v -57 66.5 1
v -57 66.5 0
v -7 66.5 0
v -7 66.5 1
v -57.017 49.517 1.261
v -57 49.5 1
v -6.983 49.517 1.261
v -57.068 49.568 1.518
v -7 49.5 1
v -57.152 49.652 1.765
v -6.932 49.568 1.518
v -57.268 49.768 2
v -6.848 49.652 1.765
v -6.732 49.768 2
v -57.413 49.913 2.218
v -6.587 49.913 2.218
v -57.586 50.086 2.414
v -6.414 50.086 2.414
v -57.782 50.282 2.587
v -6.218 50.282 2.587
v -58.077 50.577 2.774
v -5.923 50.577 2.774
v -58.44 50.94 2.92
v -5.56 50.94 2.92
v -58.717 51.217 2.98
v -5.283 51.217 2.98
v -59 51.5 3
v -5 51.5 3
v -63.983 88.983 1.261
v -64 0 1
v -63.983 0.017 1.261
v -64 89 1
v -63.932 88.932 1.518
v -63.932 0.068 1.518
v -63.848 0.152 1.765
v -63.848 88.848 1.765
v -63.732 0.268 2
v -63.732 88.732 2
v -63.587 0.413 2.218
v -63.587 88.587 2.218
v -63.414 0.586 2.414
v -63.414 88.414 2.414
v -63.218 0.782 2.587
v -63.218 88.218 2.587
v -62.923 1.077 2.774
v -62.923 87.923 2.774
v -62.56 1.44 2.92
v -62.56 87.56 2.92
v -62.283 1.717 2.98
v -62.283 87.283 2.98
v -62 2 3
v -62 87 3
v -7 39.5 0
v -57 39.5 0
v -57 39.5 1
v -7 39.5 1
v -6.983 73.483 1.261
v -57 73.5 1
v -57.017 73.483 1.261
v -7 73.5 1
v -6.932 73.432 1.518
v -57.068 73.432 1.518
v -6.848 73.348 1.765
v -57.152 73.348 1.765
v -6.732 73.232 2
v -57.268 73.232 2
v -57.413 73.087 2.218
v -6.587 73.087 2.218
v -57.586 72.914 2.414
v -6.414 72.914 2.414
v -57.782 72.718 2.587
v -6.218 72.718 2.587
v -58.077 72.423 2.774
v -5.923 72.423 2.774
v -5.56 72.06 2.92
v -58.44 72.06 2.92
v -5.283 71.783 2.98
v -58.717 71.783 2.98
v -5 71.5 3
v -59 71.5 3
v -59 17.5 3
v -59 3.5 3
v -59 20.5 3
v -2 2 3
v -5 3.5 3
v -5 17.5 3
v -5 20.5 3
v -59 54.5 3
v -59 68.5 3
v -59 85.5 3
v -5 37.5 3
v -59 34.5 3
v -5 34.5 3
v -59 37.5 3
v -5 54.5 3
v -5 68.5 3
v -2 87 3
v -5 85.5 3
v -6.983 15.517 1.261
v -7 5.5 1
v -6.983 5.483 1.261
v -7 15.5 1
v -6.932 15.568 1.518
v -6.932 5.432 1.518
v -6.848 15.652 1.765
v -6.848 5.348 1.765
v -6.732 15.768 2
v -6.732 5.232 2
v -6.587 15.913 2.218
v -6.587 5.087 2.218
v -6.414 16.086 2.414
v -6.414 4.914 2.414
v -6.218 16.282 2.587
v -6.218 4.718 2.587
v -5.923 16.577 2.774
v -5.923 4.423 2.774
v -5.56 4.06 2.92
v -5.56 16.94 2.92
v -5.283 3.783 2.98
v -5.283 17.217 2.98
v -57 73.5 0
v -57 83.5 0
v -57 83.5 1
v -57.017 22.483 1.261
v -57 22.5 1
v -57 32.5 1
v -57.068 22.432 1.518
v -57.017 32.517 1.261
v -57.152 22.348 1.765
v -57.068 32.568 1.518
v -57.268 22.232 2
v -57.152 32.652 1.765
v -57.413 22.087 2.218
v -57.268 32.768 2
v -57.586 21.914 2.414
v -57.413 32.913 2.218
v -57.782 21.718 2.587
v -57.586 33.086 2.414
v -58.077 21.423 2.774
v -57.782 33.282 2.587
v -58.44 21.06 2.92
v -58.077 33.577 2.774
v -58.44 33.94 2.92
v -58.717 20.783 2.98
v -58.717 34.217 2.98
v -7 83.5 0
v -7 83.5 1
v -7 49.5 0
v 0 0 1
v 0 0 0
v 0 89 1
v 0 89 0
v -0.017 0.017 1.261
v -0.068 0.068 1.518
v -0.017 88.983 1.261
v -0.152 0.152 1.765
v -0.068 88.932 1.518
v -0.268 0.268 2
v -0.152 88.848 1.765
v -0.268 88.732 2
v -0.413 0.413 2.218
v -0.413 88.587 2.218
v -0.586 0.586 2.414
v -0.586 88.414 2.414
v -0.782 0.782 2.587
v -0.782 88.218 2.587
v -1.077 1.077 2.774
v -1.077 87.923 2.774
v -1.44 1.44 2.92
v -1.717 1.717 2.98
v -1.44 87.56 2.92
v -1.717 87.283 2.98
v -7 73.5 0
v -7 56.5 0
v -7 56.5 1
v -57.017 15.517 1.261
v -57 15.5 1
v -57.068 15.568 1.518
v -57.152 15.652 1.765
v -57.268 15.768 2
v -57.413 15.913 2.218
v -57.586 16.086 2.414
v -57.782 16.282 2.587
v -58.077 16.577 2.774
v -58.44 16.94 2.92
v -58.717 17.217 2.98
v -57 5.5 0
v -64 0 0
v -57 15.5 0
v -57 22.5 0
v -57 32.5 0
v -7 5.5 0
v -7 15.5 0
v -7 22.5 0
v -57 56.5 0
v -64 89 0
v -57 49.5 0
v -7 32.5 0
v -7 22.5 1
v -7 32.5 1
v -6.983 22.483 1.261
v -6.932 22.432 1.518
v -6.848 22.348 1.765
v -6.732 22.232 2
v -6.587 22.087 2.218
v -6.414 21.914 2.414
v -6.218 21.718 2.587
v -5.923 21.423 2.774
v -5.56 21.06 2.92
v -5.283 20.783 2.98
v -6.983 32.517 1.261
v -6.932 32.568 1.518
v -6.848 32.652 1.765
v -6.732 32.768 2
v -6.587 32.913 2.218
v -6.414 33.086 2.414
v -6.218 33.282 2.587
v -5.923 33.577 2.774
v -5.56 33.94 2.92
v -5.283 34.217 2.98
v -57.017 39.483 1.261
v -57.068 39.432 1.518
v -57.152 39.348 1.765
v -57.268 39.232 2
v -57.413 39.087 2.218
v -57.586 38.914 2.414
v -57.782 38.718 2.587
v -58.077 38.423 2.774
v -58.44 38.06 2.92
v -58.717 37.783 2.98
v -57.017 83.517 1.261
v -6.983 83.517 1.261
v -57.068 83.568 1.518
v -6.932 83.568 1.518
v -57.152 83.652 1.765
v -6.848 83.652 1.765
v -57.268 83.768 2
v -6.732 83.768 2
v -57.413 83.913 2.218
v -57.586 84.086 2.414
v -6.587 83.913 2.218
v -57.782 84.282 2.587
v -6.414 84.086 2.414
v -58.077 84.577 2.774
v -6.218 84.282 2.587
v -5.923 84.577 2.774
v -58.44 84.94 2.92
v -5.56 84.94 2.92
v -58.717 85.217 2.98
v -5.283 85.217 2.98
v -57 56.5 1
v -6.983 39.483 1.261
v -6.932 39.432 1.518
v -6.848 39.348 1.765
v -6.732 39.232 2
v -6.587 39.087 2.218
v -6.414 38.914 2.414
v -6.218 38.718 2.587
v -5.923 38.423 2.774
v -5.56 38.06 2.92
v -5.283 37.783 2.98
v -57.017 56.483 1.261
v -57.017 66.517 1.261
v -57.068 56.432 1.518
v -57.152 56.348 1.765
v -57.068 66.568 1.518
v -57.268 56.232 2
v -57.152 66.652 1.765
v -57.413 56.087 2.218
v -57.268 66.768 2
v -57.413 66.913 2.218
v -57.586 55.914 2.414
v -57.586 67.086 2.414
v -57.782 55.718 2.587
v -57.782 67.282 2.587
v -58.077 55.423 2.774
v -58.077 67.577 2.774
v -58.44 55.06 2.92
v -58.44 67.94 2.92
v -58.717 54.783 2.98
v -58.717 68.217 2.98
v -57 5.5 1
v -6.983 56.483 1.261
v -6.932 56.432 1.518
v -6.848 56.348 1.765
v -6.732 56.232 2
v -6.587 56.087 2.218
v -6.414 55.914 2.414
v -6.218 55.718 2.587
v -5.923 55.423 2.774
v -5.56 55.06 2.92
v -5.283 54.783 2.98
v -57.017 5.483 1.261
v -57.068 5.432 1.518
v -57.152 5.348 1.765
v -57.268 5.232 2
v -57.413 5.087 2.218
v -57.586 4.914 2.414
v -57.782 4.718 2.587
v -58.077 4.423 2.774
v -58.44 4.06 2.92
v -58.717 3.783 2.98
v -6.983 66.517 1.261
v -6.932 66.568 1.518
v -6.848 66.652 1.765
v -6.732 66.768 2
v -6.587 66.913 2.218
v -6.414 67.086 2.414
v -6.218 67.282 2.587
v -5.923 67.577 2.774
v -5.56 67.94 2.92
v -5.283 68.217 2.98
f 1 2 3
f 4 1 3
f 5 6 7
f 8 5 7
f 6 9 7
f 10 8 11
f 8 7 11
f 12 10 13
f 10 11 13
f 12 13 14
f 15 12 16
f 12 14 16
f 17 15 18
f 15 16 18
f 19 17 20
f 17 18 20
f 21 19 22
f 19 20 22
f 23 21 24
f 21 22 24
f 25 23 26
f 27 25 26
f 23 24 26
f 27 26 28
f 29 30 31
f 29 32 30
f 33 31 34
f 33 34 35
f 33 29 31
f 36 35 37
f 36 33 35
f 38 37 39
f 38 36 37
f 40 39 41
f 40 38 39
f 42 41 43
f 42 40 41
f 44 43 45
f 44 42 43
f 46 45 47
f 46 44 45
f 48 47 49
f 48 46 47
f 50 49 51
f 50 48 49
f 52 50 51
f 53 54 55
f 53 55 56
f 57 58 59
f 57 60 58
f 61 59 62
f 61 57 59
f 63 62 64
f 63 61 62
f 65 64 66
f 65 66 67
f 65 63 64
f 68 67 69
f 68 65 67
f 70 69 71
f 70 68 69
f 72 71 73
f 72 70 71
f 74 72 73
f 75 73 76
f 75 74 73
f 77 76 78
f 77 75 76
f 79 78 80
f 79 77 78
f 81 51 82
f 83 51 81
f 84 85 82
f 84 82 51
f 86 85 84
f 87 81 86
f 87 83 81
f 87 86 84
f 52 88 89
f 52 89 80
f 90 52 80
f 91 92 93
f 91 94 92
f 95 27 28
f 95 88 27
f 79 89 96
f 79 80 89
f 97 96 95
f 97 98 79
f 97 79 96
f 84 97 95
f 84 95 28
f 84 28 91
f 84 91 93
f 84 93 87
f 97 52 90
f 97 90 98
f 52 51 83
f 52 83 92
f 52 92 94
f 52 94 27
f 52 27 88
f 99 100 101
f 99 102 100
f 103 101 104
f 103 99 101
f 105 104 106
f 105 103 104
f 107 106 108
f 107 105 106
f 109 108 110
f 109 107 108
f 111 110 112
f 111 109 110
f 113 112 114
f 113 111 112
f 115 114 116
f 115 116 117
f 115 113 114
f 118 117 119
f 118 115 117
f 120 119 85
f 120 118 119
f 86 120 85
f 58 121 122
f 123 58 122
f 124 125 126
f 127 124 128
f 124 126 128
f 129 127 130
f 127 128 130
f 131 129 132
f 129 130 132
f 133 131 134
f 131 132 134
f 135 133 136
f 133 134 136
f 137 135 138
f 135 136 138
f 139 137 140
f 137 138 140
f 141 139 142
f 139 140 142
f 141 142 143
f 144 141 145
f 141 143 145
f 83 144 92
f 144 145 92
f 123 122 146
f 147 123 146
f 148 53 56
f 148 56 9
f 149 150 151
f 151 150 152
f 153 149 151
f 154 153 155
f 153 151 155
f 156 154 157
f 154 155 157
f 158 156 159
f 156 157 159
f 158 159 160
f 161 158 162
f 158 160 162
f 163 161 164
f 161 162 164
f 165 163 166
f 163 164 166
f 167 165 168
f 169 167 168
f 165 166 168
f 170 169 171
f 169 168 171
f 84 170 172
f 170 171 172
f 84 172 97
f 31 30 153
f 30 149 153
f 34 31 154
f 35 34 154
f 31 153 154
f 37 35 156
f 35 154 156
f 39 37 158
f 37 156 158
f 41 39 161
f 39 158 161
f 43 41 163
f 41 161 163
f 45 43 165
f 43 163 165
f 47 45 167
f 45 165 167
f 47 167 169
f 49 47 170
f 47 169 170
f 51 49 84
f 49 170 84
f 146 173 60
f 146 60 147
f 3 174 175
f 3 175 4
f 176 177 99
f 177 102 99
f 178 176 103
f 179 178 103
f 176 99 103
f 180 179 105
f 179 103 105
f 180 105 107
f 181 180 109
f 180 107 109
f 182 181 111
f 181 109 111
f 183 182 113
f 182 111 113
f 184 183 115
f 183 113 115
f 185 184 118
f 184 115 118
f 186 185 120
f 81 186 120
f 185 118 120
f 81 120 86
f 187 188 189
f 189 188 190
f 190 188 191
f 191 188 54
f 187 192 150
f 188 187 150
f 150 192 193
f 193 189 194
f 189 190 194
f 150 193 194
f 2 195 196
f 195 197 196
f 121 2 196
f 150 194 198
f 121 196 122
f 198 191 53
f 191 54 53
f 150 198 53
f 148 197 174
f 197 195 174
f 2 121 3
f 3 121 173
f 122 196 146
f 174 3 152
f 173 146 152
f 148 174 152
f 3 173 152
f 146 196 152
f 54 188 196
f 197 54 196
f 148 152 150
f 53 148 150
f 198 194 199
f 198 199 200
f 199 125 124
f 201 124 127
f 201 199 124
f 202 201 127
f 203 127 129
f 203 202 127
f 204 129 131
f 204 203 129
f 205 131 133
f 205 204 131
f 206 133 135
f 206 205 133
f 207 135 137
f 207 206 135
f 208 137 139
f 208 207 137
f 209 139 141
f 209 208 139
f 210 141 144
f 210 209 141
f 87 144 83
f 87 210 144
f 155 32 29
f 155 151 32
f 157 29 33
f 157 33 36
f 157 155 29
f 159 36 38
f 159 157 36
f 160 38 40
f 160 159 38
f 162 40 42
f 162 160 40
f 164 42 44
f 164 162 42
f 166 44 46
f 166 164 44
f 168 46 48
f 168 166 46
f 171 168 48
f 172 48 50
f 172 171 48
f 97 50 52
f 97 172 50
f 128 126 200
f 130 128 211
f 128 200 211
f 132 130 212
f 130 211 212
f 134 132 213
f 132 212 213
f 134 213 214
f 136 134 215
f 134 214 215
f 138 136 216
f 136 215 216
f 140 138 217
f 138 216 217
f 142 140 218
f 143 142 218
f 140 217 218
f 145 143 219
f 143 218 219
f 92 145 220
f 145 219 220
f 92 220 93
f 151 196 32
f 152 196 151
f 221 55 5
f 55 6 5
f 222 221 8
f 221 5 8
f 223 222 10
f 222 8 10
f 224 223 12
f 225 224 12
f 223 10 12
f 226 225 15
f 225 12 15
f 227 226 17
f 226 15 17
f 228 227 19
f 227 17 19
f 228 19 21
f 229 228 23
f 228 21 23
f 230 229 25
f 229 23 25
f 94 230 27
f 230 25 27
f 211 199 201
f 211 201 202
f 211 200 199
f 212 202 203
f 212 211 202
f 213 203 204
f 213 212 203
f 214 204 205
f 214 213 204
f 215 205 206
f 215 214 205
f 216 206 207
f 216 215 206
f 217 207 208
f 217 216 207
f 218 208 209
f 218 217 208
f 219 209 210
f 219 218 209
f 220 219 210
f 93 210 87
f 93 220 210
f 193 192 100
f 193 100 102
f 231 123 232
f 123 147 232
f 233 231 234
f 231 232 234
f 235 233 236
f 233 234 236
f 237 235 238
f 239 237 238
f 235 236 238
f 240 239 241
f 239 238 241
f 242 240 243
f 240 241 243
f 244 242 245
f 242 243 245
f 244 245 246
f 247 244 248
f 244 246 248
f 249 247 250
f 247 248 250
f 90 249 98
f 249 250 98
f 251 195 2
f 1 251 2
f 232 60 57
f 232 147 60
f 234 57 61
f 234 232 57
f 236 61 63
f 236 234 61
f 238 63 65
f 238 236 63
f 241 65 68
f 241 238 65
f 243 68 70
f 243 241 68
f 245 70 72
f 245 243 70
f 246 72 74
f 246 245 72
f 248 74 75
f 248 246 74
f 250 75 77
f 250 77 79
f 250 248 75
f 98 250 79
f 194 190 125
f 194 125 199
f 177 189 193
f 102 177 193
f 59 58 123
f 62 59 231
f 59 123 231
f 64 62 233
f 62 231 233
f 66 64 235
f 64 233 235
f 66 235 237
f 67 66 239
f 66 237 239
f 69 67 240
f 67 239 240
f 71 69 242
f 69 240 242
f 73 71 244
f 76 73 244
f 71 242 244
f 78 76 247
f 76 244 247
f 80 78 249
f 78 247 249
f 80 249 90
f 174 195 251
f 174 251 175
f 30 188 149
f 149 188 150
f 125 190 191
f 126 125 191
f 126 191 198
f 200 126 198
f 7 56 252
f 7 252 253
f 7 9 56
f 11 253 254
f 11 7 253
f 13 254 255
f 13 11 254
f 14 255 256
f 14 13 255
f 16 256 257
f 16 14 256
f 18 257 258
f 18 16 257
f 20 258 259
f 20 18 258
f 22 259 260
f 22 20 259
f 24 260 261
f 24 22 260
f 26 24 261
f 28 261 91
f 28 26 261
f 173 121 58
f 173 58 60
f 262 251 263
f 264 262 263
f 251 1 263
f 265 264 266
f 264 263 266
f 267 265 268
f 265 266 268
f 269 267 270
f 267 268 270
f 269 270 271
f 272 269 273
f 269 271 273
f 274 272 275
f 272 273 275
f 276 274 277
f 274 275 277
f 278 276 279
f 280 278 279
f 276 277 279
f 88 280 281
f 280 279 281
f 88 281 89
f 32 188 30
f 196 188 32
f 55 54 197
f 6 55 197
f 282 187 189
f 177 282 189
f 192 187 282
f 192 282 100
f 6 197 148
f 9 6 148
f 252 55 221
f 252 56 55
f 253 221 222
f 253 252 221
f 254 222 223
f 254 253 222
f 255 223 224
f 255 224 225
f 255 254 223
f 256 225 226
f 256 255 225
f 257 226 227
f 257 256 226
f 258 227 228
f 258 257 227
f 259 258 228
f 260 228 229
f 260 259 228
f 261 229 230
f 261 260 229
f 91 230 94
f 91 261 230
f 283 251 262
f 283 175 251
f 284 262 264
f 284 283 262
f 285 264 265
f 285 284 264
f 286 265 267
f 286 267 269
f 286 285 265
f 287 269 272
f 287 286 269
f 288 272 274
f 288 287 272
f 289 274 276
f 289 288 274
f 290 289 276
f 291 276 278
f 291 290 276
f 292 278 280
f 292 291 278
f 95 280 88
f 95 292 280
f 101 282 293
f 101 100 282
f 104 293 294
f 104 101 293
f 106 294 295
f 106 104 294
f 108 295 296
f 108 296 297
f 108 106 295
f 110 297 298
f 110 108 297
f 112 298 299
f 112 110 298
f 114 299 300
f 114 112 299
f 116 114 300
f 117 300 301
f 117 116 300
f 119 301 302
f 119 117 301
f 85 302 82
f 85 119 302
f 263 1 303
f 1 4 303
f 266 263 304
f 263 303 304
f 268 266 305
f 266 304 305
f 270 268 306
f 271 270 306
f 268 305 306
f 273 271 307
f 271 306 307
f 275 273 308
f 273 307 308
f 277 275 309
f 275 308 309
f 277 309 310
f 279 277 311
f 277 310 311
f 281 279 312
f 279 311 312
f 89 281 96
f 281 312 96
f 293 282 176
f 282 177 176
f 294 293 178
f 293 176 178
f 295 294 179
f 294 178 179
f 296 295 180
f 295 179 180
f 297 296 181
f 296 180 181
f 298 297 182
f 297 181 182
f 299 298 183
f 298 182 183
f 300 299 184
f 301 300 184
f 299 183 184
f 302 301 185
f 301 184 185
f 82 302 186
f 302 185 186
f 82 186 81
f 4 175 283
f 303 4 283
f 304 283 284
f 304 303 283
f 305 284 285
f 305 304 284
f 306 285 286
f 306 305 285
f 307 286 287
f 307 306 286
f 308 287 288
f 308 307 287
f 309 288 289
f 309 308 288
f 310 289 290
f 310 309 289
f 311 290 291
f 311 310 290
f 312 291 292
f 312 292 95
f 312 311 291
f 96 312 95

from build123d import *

# Parameters (mm, degrees)
F0_W     = 64
F0_H     = 89
F0_W_2   = 63.8
F0_H_2   = 88.8
F0_W_3   = 50
F0_H_3   = 10
F1_DEPTH = 3
F2_R     = 2


with BuildPart() as f1:
    # F0 (on Top) → F1 (new body)
    with BuildSketch(Plane.XY):
        with Locations((-32, 44.5)):
            Rectangle(F0_W, F0_H)
        with Locations((-32, 44.5)):
            Rectangle(F0_W_2, F0_H_2, mode=Mode.SUBTRACT)
        with Locations((-32, 44.5)):
            Rectangle(F0_W_2, F0_H_2)
        with Locations((-32, 10.5)):
            Rectangle(F0_W_3, F0_H_3, mode=Mode.SUBTRACT)
        with Locations((-32, 27.5)):
            Rectangle(F0_W_3, F0_H_3, mode=Mode.SUBTRACT)
        with Locations((-32, 44.5)):
            Rectangle(F0_W_3, F0_H_3, mode=Mode.SUBTRACT)
        with Locations((-32, 61.5)):
            Rectangle(F0_W_3, F0_H_3, mode=Mode.SUBTRACT)
        with Locations((-32, 78.5)):
            Rectangle(F0_W_3, F0_H_3, mode=Mode.SUBTRACT)
    extrude(amount=F1_DEPTH)

    # F2
    f2_edges = [f1.edges().sort_by_distance(p)[0] for p in [
        (-57, 10.5, 3),
        (-32, 15.5, 3),
        (-7, 10.5, 3),
        (-32, 5.5, 3),
        (-57, 27.5, 3),
        (-32, 32.5, 3),
        (-7, 27.5, 3),
        (-32, 22.5, 3),
        (-32, 49.5, 3),
        (-7, 44.5, 3),
        (-32, 39.5, 3),
        (-57, 44.5, 3),
        (-7, 61.5, 3),
        (-32, 56.5, 3),
        (-57, 61.5, 3),
        (-32, 66.5, 3),
        (-7, 78.5, 3),
        (-32, 73.5, 3),
        (-57, 78.5, 3),
        (-32, 83.5, 3),
        (-32, 0, 3),
        (0, 44.5, 3),
        (-32, 89, 3),
        (-64, 44.5, 3),
    ]]
    fillet(f2_edges, radius=F2_R)


solid = f1.part
